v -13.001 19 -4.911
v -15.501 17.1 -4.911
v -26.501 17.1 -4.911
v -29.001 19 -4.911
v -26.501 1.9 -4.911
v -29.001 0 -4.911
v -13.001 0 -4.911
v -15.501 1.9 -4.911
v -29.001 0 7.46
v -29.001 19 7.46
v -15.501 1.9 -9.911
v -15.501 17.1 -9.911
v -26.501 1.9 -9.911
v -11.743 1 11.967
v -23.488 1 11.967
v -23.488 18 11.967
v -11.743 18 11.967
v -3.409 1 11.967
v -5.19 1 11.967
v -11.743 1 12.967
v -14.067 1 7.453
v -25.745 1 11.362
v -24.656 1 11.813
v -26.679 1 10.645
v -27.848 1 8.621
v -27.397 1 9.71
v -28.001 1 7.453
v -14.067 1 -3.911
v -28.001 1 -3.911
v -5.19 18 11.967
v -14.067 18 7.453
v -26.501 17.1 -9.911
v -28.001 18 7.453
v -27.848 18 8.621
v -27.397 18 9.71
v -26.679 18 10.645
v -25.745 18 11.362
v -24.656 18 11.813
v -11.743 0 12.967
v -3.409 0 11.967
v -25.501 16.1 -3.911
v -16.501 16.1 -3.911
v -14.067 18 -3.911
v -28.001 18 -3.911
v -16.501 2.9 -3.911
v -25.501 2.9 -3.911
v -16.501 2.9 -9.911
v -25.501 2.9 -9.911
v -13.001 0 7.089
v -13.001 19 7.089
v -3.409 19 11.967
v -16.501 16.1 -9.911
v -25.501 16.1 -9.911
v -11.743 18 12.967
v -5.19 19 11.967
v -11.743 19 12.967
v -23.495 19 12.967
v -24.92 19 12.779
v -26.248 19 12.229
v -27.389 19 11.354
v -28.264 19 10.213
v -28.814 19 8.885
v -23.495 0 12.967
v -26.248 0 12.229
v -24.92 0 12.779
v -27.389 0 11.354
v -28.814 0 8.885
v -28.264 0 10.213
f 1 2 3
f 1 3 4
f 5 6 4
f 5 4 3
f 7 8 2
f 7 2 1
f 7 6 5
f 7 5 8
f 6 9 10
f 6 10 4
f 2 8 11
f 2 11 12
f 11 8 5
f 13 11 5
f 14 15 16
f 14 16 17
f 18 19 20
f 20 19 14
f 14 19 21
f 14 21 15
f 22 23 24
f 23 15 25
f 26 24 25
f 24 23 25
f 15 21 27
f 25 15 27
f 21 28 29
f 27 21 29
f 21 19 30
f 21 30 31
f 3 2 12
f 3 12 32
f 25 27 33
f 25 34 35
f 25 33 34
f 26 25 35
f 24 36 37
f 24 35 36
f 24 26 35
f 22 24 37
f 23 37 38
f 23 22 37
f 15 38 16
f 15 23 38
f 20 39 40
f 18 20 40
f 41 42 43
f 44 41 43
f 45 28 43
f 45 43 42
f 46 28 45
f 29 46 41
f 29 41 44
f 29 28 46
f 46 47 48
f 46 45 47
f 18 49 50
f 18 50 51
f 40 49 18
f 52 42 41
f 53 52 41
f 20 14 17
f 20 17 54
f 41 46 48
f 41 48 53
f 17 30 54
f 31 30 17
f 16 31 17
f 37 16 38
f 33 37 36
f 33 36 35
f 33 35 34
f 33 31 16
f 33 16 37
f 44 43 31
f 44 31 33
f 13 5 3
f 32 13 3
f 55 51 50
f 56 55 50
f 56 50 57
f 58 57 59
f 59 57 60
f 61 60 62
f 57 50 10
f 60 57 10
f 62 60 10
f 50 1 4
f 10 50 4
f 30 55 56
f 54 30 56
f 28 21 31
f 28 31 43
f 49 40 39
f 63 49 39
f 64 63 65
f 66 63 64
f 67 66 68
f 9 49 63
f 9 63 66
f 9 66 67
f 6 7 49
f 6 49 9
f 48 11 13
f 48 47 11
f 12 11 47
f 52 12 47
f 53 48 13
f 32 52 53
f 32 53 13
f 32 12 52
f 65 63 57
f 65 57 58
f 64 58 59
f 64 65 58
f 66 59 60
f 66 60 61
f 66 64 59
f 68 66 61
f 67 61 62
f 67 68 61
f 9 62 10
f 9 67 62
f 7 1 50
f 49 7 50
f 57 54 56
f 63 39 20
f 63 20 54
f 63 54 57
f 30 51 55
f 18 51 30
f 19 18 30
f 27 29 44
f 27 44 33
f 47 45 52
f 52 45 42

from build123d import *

# Parameters (mm, degrees)
BOSS_EXTRUDE1_DEPTH = 19
BOSS_EXTRUDE2_DEPTH = 1
BOSS_EXTRUDE3_DEPTH = 1
SKETCH4_W           = 11
SKETCH4_H           = 15.2
SKETCH4_W_2         = 9
SKETCH4_H_2         = 13.2
BOSS_EXTRUDE4_DEPTH = 5
SKETCH5_W           = 9
SKETCH5_H           = 13.2
CUT_EXTRUDE1_DEPTH  = 13


with BuildPart() as part:
    # Sketch1 → Boss-Extrude1 (new body)
    with BuildSketch(Plane(origin=(0, 0, 0), x_dir=(1, 0, 0), z_dir=(0, 1, 0))):
        with BuildLine():
            Line((-13.001443325, 4.911000499), (-13.001443325, -7.088999501))
            Line((-13.001443325, -7.088999501), (-3.408667462, -11.966682937))
            Line((-3.408667462, -11.966682937), (-5.189854063, -11.966682937))
            Line((-5.189854063, -11.966682937), (-14.067067881, -7.452844668))
            Line((-14.067067881, -7.452844668), (-14.067067881, 3.911000499))
            Line((-14.067067881, 3.911000499), (-28.001443325, 3.911000499))
            Line((-28.001443325, 3.911000499), (-28.001443325, -7.452844668))
            ThreePointArc((-28.001443325, -7.452844668), (-26.679370706, -10.644610317), (-23.487605056, -11.966682937))
            Line((-23.487605056, -11.966682937), (-11.742872705, -11.966682937))
            Line((-11.742872705, -11.966682937), (-11.742872705, -12.966682937))
            Line((-11.742872705, -12.966682937), (-23.494591297, -12.966682937))
            ThreePointArc((-23.494591297, -12.966682937), (-27.388523709, -11.353763321), (-29.001443325, -7.459830909))
            Line((-29.001443325, -7.459830909), (-29.001443325, 4.911000499))
            Line((-29.001443325, 4.911000499), (-13.001443325, 4.911000499))
        make_face()
    extrude(amount=BOSS_EXTRUDE1_DEPTH)

    # Sketch2 → Boss-Extrude2 (add)
    with BuildSketch(Plane(origin=(0, 19, 0), x_dir=(1, 0, 0), z_dir=(0, 1, 0))):
        with BuildLine():
            Line((-29.001443325, 4.911000499), (-13.001443325, 4.911000499))
            Line((-13.001443325, 4.911000499), (-13.001443325, -7.088999501))
            Line((-13.001443325, -7.088999501), (-3.408667462, -11.966682937))
            Line((-3.408667462, -11.966682937), (-5.189854063, -11.966682937))
            Line((-5.189854063, -11.966682937), (-11.742872705, -12.966682937))
            Line((-11.742872705, -12.966682937), (-23.494591297, -12.966682937))
            ThreePointArc((-23.494591297, -12.966682937), (-27.388523709, -11.353763321), (-29.001443325, -7.459830909))
            Line((-29.001443325, -7.459830909), (-29.001443325, 4.911000499))
        make_face()
    extrude(amount=-BOSS_EXTRUDE2_DEPTH)

    # Sketch3 → Boss-Extrude3 (add)
    with BuildSketch(Plane(origin=(0, 0, 0), x_dir=(-1, 0, 0), z_dir=(0, -1, 0))):
        with BuildLine():
            Line((29.001443325, -7.459830909), (29.001443325, 4.911000499))
            Line((29.001443325, 4.911000499), (13.001443325, 4.911000499))
            Line((13.001443325, 4.911000499), (13.001443325, -7.088999501))
            Line((13.001443325, -7.088999501), (3.408667462, -11.966682937))
            Line((3.408667462, -11.966682937), (5.189854063, -11.966682937))
            Line((5.189854063, -11.966682937), (14.067067881, -7.452844668))
            Line((14.067067881, -7.452844668), (14.067067881, 3.911000499))
            Line((14.067067881, 3.911000499), (28.001443325, 3.911000499))
            Line((28.001443325, 3.911000499), (28.001443325, -7.452844668))
            ThreePointArc((28.001443325, -7.452844668), (26.679370706, -10.644610317), (23.487605056, -11.966682937))
            Line((23.487605056, -11.966682937), (11.742872705, -11.966682937))
            Line((11.742872705, -11.966682937), (11.742872705, -12.966682937))
            Line((11.742872705, -12.966682937), (23.494591297, -12.966682937))
            ThreePointArc((23.494591297, -12.966682937), (27.388523709, -11.353763321), (29.001443325, -7.459830909))
        make_face()
        with BuildLine():
            Line((11.742872705, -12.966682937), (3.408667462, -11.966682937))
            Line((3.408667462, -11.966682937), (5.189854063, -11.966682937))
            Line((5.189854063, -11.966682937), (14.067067881, -7.452844668))
            Line((14.067067881, -7.452844668), (14.067067881, 3.911000499))
            Line((14.067067881, 3.911000499), (28.001443325, 3.911000499))
            Line((28.001443325, 3.911000499), (28.001443325, -7.452844668))
            ThreePointArc((28.001443325, -7.452844668), (26.679370706, -10.644610317), (23.487605056, -11.966682937))
            Line((23.487605056, -11.966682937), (11.742872705, -11.966682937))
            Line((11.742872705, -11.966682937), (11.742872705, -12.966682937))
        make_face()
    extrude(amount=-BOSS_EXTRUDE3_DEPTH)

    # Sketch4 → Boss-Extrude4 (add)
    with BuildSketch(Plane(origin=(0, 0, -4.911000499), x_dir=(-1, 0, 0), z_dir=(0, 0, -1))):
        with Locations((21.001443325, 9.5)):
            Rectangle(SKETCH4_W, SKETCH4_H)
        with Locations((21.001443325, 9.5)):
            Rectangle(SKETCH4_W_2, SKETCH4_H_2, mode=Mode.SUBTRACT)
    extrude(amount=BOSS_EXTRUDE4_DEPTH)

    # Sketch5 → Cut-Extrude1 (cut)
    with BuildSketch(Plane(origin=(0, 0, -9.911000499), x_dir=(-1, 0, 0), z_dir=(0, 0, -1))):
        with Locations((21.001443325, 9.5)):
            Rectangle(SKETCH5_W, SKETCH5_H)
    extrude(amount=-CUT_EXTRUDE1_DEPTH, mode=Mode.SUBTRACT)


solid = part.part
